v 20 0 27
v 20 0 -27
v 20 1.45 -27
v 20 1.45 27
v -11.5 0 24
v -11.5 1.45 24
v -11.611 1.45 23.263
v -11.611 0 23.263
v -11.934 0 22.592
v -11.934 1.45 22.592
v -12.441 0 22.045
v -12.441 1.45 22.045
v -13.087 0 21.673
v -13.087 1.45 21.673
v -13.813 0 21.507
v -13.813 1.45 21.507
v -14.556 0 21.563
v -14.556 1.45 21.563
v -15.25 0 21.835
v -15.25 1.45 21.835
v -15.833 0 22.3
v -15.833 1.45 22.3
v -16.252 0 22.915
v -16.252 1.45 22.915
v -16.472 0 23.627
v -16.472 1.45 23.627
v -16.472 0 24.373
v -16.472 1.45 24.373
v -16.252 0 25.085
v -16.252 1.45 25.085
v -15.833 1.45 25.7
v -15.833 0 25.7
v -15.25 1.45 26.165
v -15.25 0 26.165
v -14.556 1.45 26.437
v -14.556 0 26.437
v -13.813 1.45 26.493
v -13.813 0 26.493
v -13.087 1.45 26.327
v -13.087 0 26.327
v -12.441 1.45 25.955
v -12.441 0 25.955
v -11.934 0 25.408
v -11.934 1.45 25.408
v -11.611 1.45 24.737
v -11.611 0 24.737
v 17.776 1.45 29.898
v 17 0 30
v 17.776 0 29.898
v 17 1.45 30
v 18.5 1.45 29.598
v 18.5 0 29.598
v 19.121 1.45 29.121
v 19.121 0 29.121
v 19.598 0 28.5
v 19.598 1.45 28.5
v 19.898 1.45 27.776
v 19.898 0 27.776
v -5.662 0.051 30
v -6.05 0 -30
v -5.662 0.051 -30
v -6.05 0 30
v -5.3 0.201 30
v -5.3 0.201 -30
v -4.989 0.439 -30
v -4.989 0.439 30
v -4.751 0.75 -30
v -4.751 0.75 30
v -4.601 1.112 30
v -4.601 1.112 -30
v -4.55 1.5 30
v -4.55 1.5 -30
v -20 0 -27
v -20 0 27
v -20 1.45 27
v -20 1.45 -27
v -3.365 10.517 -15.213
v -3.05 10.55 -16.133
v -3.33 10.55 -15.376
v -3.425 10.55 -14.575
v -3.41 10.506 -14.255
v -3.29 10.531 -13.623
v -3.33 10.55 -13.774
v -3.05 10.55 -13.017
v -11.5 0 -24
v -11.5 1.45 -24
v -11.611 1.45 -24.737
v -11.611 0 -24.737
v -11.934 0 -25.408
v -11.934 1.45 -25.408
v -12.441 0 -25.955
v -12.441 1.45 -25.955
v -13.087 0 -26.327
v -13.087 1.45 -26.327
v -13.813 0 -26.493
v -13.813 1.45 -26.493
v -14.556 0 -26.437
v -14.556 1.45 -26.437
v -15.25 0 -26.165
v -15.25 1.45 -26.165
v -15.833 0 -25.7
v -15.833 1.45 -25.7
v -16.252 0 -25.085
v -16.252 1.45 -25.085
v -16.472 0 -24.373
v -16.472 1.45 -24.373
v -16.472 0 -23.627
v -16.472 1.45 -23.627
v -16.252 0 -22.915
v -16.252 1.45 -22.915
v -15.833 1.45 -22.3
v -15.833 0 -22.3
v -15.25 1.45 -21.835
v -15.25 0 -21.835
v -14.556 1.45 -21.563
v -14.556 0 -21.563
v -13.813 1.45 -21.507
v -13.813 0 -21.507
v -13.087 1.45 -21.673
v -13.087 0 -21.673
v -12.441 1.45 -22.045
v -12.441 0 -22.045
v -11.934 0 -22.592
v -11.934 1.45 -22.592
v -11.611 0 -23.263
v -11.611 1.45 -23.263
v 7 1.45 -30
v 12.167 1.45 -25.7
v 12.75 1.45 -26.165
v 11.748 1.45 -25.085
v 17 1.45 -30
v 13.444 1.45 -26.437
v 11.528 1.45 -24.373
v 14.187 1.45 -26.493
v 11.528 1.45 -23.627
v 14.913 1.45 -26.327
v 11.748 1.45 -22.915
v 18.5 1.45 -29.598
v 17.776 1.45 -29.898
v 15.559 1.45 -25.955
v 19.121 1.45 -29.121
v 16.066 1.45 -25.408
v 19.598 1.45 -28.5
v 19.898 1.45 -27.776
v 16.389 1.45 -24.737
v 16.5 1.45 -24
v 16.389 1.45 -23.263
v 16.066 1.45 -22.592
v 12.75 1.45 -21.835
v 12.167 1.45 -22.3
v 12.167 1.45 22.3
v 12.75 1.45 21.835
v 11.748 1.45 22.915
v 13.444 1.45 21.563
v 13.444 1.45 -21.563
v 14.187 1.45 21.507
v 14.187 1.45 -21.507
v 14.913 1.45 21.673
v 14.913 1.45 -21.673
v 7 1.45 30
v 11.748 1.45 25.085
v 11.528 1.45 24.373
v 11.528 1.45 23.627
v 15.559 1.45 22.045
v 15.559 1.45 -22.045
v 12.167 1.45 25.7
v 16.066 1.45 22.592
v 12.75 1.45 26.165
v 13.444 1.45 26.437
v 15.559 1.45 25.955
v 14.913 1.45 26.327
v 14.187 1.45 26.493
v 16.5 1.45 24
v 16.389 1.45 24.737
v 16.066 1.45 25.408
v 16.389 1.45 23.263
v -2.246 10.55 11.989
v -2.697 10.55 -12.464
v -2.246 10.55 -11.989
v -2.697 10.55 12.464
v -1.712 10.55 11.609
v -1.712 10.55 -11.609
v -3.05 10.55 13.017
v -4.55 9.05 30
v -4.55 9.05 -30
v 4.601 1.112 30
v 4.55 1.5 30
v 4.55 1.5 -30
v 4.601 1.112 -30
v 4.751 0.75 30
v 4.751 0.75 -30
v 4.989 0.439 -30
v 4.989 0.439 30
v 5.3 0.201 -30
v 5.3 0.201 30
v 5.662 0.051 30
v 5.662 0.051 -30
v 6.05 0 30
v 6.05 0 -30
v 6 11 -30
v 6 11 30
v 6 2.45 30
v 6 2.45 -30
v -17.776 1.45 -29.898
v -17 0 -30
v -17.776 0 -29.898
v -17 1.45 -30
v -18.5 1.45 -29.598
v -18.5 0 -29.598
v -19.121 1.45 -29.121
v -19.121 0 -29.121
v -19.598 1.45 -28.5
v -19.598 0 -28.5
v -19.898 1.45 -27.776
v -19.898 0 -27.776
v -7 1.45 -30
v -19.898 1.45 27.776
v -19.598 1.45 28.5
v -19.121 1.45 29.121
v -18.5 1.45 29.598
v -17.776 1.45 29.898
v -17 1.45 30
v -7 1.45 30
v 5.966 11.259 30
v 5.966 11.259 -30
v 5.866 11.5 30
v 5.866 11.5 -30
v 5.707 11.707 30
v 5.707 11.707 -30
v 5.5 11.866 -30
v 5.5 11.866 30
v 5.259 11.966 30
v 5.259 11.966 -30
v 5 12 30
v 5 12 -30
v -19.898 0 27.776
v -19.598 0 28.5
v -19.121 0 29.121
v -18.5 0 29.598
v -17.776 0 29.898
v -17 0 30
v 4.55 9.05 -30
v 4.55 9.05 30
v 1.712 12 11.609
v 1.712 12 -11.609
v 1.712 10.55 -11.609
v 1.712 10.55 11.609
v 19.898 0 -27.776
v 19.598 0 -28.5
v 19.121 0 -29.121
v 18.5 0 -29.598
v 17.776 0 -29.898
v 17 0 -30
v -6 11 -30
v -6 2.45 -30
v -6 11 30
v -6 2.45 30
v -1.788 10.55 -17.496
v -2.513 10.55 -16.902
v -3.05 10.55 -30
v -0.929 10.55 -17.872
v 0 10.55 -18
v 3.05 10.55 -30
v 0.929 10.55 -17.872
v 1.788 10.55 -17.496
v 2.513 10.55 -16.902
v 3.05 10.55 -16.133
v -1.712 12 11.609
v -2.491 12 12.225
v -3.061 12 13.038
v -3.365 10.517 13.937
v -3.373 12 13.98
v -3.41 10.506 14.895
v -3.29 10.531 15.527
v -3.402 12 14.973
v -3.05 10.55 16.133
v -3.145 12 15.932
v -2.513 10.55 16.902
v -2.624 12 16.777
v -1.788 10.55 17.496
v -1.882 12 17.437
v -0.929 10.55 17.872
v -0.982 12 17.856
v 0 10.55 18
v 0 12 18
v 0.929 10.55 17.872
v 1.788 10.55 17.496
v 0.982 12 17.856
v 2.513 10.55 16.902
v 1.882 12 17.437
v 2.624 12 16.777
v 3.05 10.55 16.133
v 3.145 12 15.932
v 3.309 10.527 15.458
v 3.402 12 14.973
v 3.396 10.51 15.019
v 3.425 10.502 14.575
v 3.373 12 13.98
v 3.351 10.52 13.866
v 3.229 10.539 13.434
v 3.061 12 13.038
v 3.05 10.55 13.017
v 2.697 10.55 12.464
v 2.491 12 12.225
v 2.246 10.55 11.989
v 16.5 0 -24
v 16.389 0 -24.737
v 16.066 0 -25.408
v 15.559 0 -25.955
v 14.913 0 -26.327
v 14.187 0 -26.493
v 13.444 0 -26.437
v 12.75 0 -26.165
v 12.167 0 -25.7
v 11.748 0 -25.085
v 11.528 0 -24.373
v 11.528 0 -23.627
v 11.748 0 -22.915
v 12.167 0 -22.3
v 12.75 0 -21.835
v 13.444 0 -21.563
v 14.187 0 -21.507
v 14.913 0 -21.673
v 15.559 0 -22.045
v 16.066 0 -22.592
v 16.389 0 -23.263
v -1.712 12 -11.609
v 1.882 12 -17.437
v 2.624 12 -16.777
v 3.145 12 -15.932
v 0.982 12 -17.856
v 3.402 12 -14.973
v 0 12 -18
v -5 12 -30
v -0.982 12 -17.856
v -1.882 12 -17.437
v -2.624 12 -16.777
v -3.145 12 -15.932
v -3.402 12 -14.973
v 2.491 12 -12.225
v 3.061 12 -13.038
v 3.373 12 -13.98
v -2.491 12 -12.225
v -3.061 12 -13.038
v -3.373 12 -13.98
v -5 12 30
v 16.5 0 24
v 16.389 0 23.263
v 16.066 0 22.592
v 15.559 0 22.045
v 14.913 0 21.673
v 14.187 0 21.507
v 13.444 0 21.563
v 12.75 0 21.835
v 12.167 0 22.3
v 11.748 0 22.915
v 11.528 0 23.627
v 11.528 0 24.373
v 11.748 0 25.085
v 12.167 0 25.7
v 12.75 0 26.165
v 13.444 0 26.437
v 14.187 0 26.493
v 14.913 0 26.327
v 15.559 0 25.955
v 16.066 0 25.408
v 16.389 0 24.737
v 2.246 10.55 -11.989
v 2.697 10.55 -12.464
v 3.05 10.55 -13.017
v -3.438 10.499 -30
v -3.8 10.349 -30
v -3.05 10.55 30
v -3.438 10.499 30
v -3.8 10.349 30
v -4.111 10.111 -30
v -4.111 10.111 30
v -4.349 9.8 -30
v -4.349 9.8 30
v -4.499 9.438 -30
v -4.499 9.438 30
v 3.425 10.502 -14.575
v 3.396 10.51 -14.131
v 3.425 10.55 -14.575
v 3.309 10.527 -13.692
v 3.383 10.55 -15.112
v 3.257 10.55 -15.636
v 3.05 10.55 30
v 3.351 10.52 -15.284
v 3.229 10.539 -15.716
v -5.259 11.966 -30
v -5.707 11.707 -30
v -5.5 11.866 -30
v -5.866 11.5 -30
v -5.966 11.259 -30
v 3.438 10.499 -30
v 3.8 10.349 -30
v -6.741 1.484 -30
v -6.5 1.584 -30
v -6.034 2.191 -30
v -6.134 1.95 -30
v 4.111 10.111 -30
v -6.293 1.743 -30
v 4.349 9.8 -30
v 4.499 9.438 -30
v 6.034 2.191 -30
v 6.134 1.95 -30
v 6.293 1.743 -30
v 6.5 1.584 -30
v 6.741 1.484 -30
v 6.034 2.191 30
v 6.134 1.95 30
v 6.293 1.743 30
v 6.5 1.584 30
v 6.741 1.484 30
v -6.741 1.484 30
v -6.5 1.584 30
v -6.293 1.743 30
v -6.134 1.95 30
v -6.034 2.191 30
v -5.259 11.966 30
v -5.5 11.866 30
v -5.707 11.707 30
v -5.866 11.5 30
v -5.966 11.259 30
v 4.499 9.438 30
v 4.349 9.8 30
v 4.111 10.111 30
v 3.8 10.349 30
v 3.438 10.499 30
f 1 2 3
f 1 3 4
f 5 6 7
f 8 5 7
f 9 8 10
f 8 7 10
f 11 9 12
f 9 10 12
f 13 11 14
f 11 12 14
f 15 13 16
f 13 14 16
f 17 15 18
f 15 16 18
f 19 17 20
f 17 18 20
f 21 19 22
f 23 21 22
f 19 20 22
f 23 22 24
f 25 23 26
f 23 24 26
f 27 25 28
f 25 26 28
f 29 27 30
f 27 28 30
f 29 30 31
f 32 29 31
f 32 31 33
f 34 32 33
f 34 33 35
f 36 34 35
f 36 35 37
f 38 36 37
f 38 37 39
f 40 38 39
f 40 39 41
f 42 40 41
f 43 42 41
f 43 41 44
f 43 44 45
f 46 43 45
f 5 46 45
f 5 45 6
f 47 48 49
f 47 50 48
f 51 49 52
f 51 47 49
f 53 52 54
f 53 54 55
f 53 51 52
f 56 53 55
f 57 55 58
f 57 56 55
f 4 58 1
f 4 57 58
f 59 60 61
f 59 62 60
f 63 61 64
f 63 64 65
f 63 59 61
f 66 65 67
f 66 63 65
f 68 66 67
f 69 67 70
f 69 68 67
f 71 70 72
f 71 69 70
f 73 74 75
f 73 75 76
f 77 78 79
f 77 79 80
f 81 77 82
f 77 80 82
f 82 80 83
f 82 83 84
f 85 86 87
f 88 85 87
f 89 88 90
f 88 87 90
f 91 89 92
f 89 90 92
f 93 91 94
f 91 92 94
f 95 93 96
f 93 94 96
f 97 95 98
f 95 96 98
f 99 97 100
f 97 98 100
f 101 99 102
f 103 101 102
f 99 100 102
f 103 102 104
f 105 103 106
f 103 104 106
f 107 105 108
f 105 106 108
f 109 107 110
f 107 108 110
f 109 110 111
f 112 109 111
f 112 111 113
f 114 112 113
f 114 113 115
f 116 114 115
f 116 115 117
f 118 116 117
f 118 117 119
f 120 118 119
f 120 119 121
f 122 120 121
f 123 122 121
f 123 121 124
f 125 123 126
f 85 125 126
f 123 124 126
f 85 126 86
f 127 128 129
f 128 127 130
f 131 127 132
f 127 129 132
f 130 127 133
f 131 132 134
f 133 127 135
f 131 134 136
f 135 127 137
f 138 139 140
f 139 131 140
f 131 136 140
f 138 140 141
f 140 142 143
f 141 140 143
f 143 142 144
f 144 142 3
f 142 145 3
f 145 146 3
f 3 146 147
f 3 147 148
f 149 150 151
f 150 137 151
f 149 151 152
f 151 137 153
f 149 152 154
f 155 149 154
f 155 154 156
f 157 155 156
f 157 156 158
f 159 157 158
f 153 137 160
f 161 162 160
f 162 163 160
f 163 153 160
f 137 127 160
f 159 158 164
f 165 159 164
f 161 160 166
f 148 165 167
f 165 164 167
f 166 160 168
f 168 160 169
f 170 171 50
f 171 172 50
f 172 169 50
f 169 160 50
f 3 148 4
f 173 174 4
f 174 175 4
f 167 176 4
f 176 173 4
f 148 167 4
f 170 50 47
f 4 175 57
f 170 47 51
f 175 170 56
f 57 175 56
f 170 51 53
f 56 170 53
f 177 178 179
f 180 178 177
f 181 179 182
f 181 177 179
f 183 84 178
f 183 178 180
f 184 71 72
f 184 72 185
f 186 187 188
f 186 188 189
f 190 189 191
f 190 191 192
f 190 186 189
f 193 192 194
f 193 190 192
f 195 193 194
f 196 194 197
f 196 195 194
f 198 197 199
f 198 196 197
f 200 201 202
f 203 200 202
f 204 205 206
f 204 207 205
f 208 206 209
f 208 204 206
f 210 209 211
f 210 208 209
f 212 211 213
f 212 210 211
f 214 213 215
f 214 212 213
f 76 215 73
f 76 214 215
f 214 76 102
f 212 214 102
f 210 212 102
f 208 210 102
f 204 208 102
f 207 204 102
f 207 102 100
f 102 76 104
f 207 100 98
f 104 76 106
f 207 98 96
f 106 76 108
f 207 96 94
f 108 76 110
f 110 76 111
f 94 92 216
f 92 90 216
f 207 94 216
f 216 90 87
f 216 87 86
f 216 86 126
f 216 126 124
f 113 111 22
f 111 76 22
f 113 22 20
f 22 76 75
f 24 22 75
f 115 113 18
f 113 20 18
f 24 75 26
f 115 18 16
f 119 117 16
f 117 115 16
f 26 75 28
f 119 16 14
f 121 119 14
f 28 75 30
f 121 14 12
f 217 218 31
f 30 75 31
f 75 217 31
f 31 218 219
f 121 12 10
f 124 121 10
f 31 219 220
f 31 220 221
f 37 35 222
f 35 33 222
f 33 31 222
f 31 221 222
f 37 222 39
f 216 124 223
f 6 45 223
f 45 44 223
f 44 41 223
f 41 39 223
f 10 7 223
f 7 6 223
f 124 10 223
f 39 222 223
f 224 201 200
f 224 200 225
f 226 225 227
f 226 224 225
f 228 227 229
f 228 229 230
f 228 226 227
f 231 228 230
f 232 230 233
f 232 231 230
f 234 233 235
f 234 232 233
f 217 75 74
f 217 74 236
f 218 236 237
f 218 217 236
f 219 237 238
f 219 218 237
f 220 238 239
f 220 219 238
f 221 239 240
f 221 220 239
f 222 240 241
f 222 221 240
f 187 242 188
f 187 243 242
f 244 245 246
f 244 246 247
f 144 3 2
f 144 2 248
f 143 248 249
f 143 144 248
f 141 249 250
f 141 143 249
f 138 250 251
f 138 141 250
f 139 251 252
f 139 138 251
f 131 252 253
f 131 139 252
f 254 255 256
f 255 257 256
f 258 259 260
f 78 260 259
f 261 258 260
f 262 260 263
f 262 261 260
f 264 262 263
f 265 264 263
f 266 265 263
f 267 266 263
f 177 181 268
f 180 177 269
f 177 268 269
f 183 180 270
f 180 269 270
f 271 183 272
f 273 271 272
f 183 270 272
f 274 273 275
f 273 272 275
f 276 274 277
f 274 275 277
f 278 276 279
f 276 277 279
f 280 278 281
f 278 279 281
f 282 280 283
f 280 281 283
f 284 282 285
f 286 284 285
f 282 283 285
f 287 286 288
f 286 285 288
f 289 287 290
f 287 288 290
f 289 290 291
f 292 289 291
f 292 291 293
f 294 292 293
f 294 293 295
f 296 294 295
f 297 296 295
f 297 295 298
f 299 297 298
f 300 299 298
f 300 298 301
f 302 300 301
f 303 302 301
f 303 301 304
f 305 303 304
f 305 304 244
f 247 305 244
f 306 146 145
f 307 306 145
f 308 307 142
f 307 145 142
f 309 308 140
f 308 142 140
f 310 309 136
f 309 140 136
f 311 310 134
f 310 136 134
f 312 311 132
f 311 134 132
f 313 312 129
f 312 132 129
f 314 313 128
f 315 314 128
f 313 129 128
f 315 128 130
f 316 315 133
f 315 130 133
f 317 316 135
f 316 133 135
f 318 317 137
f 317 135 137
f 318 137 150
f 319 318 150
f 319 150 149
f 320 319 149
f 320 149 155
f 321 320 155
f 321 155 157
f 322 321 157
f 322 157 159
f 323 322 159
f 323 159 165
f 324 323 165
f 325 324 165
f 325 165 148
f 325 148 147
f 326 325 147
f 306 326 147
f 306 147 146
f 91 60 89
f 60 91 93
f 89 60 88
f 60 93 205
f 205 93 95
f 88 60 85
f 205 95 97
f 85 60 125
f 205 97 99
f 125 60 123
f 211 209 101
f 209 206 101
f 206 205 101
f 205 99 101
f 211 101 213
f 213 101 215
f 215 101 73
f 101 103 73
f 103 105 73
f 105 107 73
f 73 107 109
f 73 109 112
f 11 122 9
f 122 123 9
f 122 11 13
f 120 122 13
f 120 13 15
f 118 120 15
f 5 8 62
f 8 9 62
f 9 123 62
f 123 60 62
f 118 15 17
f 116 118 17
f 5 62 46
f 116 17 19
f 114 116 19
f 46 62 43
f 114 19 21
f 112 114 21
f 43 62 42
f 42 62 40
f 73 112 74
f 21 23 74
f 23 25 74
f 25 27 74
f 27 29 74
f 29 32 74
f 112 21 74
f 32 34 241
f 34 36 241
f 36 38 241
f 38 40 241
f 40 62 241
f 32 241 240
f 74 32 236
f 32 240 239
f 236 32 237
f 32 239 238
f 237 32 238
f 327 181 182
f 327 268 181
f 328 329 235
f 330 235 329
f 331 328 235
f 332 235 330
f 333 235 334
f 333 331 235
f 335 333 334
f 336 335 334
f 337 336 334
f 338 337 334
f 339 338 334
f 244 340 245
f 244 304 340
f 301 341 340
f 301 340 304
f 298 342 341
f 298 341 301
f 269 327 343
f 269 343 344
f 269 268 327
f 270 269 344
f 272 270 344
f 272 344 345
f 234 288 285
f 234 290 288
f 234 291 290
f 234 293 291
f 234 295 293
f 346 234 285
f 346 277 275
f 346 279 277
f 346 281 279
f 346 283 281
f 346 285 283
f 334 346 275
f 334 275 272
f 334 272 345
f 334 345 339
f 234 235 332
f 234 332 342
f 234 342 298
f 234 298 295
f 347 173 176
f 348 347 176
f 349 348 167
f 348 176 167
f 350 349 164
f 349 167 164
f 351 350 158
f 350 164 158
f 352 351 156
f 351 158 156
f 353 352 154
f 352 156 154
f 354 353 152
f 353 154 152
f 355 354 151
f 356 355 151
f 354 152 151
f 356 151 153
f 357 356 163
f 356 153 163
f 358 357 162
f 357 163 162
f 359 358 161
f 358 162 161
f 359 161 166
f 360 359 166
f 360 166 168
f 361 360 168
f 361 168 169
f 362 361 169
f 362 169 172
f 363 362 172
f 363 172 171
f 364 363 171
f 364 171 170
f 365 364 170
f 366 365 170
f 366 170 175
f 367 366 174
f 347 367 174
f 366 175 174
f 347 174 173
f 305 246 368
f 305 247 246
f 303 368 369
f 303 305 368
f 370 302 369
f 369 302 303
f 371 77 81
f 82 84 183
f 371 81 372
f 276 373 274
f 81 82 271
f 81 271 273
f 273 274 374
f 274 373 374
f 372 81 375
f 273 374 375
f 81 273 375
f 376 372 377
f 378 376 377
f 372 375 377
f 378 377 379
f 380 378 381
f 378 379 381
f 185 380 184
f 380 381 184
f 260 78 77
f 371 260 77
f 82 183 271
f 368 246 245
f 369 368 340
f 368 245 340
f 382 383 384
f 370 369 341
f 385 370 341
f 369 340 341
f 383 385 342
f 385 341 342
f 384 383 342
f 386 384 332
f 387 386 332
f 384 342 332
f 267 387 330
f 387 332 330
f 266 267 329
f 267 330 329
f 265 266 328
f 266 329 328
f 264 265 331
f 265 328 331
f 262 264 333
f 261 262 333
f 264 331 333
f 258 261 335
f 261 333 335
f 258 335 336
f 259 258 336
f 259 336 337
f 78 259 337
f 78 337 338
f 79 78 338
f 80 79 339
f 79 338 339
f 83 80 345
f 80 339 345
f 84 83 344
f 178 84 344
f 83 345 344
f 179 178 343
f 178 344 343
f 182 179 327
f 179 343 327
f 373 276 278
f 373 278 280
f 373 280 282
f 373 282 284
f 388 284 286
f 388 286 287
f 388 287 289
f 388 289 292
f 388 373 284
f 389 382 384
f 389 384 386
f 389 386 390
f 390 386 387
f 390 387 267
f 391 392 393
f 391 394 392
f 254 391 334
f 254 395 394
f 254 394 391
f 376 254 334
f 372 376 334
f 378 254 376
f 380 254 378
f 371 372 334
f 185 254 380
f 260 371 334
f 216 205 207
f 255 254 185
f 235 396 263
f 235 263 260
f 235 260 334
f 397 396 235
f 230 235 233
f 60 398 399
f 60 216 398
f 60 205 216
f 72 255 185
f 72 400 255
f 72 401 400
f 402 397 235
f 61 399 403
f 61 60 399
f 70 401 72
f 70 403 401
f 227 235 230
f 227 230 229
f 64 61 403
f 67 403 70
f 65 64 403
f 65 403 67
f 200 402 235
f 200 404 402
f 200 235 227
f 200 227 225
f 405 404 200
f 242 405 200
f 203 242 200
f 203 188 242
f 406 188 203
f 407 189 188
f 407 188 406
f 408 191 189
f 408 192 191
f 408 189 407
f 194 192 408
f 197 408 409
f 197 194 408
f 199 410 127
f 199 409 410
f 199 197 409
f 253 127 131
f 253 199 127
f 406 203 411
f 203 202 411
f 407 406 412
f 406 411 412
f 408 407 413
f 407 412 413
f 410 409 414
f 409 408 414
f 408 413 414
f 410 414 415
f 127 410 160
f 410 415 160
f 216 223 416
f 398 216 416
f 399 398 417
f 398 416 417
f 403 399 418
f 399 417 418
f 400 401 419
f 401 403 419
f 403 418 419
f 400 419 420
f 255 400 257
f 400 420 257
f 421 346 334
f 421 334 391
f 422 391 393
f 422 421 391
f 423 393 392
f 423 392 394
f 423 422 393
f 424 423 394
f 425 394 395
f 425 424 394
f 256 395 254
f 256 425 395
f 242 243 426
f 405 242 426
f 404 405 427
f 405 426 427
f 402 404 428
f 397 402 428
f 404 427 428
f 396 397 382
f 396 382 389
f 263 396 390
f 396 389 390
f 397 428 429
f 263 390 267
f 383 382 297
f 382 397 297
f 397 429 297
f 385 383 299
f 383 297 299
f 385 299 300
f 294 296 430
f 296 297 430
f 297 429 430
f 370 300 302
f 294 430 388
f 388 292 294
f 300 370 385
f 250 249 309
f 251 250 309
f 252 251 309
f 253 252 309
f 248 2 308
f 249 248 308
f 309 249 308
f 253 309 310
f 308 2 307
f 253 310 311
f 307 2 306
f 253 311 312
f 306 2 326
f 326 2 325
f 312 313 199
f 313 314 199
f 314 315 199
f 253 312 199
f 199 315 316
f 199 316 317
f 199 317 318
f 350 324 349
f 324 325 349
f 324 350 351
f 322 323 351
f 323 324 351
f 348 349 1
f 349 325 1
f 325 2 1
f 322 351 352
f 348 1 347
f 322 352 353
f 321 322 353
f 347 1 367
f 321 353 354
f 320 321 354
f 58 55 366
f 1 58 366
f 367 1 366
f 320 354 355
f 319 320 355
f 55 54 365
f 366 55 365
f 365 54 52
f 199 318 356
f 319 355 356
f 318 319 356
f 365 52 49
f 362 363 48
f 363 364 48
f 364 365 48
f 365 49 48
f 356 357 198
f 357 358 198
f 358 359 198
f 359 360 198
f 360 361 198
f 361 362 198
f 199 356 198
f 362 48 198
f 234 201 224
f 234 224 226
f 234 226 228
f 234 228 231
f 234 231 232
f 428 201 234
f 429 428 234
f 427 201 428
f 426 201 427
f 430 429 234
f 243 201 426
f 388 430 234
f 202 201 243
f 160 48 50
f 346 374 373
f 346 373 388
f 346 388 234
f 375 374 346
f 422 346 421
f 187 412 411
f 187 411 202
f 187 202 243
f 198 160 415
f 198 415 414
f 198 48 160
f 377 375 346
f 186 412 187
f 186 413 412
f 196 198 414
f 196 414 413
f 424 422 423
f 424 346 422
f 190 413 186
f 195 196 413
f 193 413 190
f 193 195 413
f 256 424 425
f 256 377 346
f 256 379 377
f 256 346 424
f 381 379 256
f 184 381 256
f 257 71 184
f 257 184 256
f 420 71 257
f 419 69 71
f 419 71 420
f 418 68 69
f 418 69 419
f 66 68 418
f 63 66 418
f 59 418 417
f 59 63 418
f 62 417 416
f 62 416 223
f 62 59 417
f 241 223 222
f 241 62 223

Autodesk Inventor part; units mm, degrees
ref_plane "YZ Plane" through (0, 0, 0) normal (1, 0, 0) x (0, 1, 0)
ref_plane "XZ Plane" through (0, 0, 0) normal (0, 1, 0) x (-1, 0, 0)
ref_plane "XY Plane" through (0, 0, 0) normal (0, 0, 1) x (1, 0, 0)
sketch "Sketch1" plane through (0, 0, 0) normal (0, 1, 0) x (-1, 0, 0)
  line L0 (-20, 30) -> (20, 30)
  line L1 (20, 30) -> (20, -30)
  line L2 (20, -30) -> (-20, -30)
  line L3 (-20, -30) -> (-20, 30)
  line L4 (-20, 30) -> (20, -30) construction
  line L5 (20, 30) -> (-20, -30) construction
  point P0 (0, 0)
  dimension "d0" = 40
  dimension "d1" = 60
extrude "Extrusion1" add sketch "Sketch1" along normal blind 12
sketch "Sketch2" plane through (-20, 0, 30) normal (0, 0, 1) x (1, 0, 0)
  line L0 (0, 0) -> (0, 12) projected
  line L1 (0, 0) -> (0, 1.45)
  line L2 (0, 1.45) -> (14, 1.45)
  line L3 (14, 1.45) -> (14, 12)
  line L4 (40, 12) -> (0, 12) projected
  line L5 (14, 12) -> (26, 12)
  line L6 (26, 12) -> (26, 1.45)
  line L7 (26, 1.45) -> (40, 1.45)
  line L8 (40, 0) -> (40, 12) projected
  line L9 (0, 12) -> (14, 12)
  line L10 (14, 12) -> (14, 1.45)
  line L11 (14, 1.45) -> (0, 1.45)
  line L12 (0, 1.45) -> (0, 12)
  line L13 (26, 1.45) -> (40, 1.45)
  line L14 (40, 1.45) -> (40, 12)
  line L15 (40, 12) -> (26, 12)
  line L16 (26, 12) -> (26, 1.45)
  line L17 (14, 1.45) -> (15.45, 1.45)
  line L18 (15.45, 1.45) -> (15.45, 12)
  line L19 (14, 12) -> (14, 10.55)
  line L20 (14, 10.55) -> (26, 10.55)
  line L21 (26, 12) -> (24.55, 12)
  line L22 (24.55, 12) -> (24.55, 1.45)
  line L23 (15.45, 10.55) -> (24.55, 10.55)
  line L24 (24.55, 10.55) -> (24.55, 0)
  line L25 (24.55, 0) -> (15.45, 0)
  line L26 (15.45, 0) -> (15.45, 10.55)
  point P0 (20, 0)
  point P1 (24.55, 1.45)
  point P2 (24.55, 10.55)
  point P3 (15.45, 1.45)
  dimension "d4" = 1.45
  dimension "d5" = 14
  dimension "d6" = 12
  dimension "d10" = 1.45
  dimension "d11" = 1.45
  dimension "d12" = 1.45
extrude "Extrusion2" cut sketch "Sketch2" against normal up to surface (60 mm away) contours L0 L4 L3 L2 | L18 L20 L22 L24 L25 L26 | L4 L8 L7 L6
sketch "Sketch3" plane through (-6, 1.45, 30) normal (0, 1, 0) x (1, 0, 0)
  line L0 (-14, 60) -> (-14, 0) projected
  line L1 (26, 0) -> (26, 60) projected
  line L2 (-14, 60) -> (26, 60)
  line L3 (26, 60) -> (26, 0)
  line L4 (26, 0) -> (-14, 0)
  line L5 (-14, 0) -> (-14, 60)
  line L6 (-14, 60) -> (-8, 60)
  line L7 (-8, 60) -> (-8, 54)
  line L8 (-8, 54) -> (-14, 54)
  line L9 (-14, 54) -> (-14, 60)
  circle A0 centre (-8, 54) radius 2.5
  line L10 (26, 60) -> (20, 60)
  line L11 (20, 60) -> (20, 54)
  line L12 (20, 54) -> (26, 54)
  line L13 (26, 54) -> (26, 60)
  circle A1 centre (20, 54) radius 2.5
  line L14 (26, 0) -> (25.5, 0) projected
  line L15 (26, 0) -> (20, 0)
  line L16 (20, 0) -> (20, 6)
  line L17 (20, 6) -> (26, 6)
  line L18 (26, 6) -> (26, 0)
  line L19 (-14, 0) -> (-8, 0)
  line L20 (-8, 0) -> (-8, 6)
  line L21 (-8, 6) -> (-14, 6)
  line L22 (-14, 6) -> (-14, 0)
  circle A2 centre (-8, 6) radius 2.5
  circle A3 centre (20, 6) radius 2.5
  point P0 (6, 30)
  dimension "d15" = 6
  dimension "d16" = 6
  dimension "d17" = 5
  dimension "d18" = 6
  dimension "d19" = 6
  dimension "d20" = 5
  dimension "d21" = 6
  dimension "d22" = 6
  dimension "d23" = 5
  dimension "d24" = 5
  dimension "d25" = 6
  dimension "d26" = 6
extrude "Extrusion3" cut sketch "Sketch3" against normal blind 12 contours A0 L7 L8 | L8 L7 A0 | A2 L20 L21 | L21 L20 A2 | A1 L12 L11 | L11 L12 A1 | A3 L17 L16 | L16 L17 A3
sketch "Sketch4" plane through (0, 12, 0) normal (0, 1, 0) x (1, 0, 0)
  line L0 (4.55, 30) -> (-4.55, 30) projected
  line L1 (0, 30) -> (0, 18)
  line L2 (-4.55, -30) -> (4.55, -30) projected
  line L3 (0, -30) -> (0, -18)
  line L4 (0, 18) -> (0, 14.575)
  line L5 (0, -18) -> (0, -14.575)
  circle A0 centre (0, 14.575) radius 3.425
  circle A1 centre (0, -14.575) radius 3.425
  line L6 (0, 14.575) -> (1.7125, 14.575)
  line L7 (1.7125, 14.575) -> (1.7125, -14.575)
  line L8 (1.7125, -14.575) -> (0, -14.575)
  line L9 (0, -14.575) -> (0, 14.575)
  line L10 (0, 14.575) -> (1.7125, 14.575) construction
  line L11 (0, -14.575) -> (-1.7125, -14.575)
  line L12 (-1.7125, -14.575) -> (-1.7125, 14.575)
  line L13 (-1.7125, 14.575) -> (0, 14.575)
  line L14 (0, 14.575) -> (0, -14.575)
  point P0 (0, 0)
  point P1 (3.55, 30)
  point P2 (-3.55, 30)
  point P3 (-3.55, -30)
  point P4 (3.55, -30)
  point P5 (1.7125, -11.6089)
  point P6 (1.7125, 11.6089)
  point P7 (-1.7125, 11.6089)
  point P8 (-1.7125, -11.6089)
  dimension "d29" = 12
  dimension "d30" = 12
  dimension "d31" = 3.425
  dimension "d32" = 3.425
  dimension "d33" = 1.7125
  dimension "d34" = 0
  dimension "d35" = 1.7125
extrude "Extrusion4" cut sketch "Sketch4" against normal blind 12
fillet "Fillet3" radius 3 4 edges at (20, 0.725, 30) (-20, 0.725, 30) (20, 0.725, -30) (-20, 0.725, -30)
fillet "Fillet4" radius 1 4 edges at (6, 1.45, 0) (6, 12, 0) (-6, 12, 0) (-6, 1.45, 0)
fillet "Fillet4" radius 1.5 4 edges at (-4.55, 10.55, 0) (4.55, 10.55, 0) (4.55, 0, 0) (-4.55, 0, 0)
equation "\"d10\" = d4"
equation "\"d11\" = d4"
equation "\"d12\" = d4"
equation "\"d18\" = d15"
equation "\"d19\" = d16"
equation "\"d20\" = d17"
equation "\"d21\" = d15"
equation "\"d22\" = d16"
equation "\"d23\" = d17"
equation "\"d24\" = d17"
equation "\"d25\" = d15"
equation "\"d26\" = d16"
equation "\"d30\" = d29"
equation "\"d32\" = d31"
properties part number "part1pasador"
